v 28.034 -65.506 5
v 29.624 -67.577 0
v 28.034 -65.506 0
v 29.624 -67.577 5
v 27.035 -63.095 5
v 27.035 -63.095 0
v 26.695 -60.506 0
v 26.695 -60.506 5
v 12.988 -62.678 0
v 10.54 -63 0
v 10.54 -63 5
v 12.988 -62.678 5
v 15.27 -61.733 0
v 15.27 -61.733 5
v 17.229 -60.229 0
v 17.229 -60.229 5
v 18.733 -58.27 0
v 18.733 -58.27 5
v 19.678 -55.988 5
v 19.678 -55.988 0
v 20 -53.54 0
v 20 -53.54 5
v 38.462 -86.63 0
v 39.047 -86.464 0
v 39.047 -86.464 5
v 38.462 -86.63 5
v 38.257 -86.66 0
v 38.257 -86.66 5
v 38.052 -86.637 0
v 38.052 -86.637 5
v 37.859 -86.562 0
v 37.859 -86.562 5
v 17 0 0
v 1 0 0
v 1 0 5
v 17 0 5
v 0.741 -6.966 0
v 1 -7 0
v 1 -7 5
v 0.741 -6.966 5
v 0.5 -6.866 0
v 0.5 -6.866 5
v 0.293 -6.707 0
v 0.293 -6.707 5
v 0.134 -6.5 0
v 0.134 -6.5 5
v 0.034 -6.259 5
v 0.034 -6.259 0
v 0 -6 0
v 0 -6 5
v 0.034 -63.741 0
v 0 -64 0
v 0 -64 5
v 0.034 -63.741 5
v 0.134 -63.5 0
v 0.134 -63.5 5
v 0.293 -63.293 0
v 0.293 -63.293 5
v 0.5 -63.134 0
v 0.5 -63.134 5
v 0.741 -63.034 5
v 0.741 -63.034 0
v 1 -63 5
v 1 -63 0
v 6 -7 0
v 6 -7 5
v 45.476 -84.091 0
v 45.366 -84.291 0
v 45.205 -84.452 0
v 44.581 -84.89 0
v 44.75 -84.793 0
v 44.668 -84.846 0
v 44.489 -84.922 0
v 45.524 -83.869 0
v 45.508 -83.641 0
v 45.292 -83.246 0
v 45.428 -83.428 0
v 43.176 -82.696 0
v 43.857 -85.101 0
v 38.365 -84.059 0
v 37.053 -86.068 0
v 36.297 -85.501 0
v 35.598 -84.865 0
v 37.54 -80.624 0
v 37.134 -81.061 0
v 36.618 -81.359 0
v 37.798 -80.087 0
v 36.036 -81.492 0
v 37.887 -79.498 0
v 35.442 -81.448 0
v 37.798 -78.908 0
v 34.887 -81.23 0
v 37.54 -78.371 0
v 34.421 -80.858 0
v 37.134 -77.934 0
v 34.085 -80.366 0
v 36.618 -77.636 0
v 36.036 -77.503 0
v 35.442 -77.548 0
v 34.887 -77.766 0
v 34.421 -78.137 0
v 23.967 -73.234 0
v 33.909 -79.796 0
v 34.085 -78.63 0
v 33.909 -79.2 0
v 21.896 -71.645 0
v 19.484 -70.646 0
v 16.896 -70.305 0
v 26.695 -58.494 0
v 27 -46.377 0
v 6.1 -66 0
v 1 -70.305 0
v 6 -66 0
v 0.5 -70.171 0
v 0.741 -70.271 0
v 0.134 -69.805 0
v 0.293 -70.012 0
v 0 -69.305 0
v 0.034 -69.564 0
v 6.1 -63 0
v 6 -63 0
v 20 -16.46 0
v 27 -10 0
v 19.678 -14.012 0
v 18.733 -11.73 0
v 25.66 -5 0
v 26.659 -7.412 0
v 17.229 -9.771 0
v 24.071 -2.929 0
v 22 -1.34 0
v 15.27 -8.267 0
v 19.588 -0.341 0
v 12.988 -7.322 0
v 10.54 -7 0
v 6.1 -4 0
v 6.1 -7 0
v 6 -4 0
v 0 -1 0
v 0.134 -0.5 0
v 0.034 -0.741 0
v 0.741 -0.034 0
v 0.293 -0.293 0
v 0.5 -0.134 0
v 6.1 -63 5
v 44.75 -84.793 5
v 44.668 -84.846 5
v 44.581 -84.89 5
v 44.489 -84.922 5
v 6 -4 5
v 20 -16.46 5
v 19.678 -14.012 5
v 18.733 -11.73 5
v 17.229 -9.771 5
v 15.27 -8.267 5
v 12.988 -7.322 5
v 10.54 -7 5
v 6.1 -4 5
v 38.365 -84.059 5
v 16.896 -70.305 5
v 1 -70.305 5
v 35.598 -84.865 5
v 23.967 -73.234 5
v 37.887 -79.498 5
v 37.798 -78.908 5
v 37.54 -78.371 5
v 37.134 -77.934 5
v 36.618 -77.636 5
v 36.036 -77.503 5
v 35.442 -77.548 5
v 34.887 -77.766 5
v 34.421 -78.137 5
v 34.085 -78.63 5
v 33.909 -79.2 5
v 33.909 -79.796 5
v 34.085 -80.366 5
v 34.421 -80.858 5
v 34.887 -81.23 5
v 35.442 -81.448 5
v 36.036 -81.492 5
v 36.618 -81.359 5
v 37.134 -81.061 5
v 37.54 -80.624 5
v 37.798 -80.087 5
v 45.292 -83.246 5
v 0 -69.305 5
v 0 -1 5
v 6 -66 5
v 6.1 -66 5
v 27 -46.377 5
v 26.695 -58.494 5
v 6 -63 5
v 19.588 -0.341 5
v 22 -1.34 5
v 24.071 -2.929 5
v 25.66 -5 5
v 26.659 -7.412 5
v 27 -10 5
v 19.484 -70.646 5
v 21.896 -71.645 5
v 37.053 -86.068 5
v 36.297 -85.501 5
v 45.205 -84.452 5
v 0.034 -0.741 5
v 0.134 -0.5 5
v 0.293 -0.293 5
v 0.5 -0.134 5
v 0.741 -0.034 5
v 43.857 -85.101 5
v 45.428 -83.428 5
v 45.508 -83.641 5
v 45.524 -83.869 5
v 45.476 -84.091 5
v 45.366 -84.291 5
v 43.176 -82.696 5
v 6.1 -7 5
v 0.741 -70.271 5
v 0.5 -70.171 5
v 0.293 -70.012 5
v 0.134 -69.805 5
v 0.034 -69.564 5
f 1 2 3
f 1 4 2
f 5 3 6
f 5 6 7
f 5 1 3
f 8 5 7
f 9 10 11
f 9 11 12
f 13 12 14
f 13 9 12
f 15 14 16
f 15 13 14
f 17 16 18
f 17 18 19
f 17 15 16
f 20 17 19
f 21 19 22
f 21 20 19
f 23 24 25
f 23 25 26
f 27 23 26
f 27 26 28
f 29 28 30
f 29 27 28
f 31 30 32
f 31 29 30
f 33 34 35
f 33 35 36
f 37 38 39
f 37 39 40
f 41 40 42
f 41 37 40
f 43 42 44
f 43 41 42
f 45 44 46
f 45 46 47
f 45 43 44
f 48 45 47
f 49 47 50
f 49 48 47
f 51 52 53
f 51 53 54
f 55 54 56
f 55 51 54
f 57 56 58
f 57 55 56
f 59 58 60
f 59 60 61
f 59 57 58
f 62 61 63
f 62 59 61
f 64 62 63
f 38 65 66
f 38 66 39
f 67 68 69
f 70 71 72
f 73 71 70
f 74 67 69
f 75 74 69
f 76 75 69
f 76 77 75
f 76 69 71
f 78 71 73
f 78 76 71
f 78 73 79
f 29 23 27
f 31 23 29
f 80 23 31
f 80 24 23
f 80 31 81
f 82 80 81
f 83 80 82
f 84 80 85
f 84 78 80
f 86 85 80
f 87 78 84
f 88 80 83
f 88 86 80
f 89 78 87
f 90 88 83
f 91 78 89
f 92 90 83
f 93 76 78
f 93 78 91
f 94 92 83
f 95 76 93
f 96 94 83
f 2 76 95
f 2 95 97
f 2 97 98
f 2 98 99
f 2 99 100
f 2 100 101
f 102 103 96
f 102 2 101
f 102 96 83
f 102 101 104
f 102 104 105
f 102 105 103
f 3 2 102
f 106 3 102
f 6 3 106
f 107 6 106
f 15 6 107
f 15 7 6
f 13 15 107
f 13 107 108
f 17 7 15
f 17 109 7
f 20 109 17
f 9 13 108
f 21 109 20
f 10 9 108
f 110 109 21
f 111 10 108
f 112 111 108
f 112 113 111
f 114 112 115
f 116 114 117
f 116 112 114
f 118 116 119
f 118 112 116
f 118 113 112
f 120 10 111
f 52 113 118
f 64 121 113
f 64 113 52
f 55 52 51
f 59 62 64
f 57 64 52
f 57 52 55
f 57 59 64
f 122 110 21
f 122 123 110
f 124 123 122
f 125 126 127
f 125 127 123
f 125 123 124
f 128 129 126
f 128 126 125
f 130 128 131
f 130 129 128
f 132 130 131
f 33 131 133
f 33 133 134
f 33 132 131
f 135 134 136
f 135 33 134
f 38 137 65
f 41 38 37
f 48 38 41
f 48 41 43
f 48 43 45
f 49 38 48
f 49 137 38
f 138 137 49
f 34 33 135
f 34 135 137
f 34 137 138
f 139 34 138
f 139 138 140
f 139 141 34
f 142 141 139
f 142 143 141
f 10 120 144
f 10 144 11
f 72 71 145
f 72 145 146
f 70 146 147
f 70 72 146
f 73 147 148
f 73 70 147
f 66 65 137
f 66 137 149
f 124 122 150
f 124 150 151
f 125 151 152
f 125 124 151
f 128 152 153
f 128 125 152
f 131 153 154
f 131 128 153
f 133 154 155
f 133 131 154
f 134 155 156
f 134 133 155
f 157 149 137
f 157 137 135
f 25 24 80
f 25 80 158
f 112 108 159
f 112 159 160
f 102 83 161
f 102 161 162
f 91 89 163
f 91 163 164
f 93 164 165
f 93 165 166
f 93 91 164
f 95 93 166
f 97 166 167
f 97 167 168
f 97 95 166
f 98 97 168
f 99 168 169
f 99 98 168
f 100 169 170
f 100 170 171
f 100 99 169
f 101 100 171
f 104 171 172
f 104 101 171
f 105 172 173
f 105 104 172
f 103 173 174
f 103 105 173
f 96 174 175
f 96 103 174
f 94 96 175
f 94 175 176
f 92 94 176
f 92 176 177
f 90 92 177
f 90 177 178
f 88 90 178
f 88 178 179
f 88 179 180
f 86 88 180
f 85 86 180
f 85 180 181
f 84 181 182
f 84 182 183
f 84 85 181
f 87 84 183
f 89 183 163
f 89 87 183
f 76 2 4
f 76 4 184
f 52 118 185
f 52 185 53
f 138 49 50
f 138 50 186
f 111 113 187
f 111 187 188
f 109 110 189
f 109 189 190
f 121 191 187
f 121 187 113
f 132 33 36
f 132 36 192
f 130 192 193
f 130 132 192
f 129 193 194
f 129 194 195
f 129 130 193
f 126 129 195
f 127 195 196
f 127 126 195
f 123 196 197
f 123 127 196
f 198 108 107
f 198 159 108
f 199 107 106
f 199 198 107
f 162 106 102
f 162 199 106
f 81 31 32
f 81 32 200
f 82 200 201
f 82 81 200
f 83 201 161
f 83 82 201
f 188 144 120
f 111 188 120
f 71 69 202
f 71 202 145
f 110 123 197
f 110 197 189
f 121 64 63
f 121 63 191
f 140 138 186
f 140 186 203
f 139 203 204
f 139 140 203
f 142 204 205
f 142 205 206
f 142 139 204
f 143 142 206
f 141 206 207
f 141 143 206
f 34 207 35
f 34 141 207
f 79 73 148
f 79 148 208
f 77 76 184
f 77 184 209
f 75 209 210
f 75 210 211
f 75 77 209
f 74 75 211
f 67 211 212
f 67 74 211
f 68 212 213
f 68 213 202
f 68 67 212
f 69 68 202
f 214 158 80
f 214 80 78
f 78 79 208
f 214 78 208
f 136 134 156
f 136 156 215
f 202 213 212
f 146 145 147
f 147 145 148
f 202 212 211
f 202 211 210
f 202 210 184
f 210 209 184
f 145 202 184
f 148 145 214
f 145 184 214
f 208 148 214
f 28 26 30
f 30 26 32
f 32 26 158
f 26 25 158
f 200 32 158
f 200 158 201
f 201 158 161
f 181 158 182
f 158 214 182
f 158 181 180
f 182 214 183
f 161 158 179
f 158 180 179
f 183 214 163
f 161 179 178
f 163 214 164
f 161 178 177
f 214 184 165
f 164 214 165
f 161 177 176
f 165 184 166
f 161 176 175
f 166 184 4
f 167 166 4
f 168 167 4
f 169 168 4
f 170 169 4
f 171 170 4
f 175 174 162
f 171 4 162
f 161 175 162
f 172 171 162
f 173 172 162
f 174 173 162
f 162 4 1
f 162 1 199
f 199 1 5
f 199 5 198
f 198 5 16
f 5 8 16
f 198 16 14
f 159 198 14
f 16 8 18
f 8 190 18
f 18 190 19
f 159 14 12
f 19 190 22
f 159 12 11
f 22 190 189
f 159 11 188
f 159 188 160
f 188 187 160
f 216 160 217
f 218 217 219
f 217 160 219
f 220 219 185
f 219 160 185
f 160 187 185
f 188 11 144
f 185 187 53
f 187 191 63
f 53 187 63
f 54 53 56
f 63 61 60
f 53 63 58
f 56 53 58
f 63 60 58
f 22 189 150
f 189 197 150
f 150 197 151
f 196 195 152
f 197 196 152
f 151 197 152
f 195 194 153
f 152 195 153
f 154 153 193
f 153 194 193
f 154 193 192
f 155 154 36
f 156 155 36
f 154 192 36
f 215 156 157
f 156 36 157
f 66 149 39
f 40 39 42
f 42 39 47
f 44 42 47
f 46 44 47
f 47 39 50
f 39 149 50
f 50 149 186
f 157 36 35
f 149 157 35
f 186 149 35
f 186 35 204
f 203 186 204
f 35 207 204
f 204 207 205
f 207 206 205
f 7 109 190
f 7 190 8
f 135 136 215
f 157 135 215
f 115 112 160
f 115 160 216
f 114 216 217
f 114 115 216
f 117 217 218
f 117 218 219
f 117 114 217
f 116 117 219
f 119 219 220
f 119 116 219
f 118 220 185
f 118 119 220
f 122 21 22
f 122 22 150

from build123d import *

# Parameters (mm, degrees)
SKETCH1_R           = 2
BOSS_EXTRUDE1_DEPTH = 5
SKETCH2_W           = 0.1
SKETCH2_H           = 5
CUT_EXTRUDE1_DEPTH  = 3
SKETCH3_W           = 0.1
SKETCH3_H           = 5
CUT_EXTRUDE2_DEPTH  = 3
SKETCH4_W           = 5
SKETCH4_H           = 5
CUT_EXTRUDE3_DEPTH  = 2.5
FILLET1_R           = 10


with BuildPart() as part:
    # Sketch1 → Boss-Extrude1 (new body)
    with BuildSketch(Plane.XY):
        with BuildLine():
            Line((1, 0), (17, 0))
            ThreePointArc((17, 0), (24.071067812, -2.928932188), (27, -10))
            Line((27, -10), (27, -10.164726931))
            Line((27, -10.164726931), (27, -46.377180563))
            Line((27, -46.377180563), (26.694646109, -58.493944172))
            Line((26.694646109, -58.493944172), (26.694646109, -64.399649032))
            Line((26.694646109, -64.399649032), (26.694646109, -64.648499642))
            Line((26.694646109, -64.648499642), (45.291824906, -83.245678439))
            ThreePointArc((45.291824906, -83.245678439), (45.524094874, -83.868523218), (45.205420336, -84.451902592))
            Line((45.205420336, -84.451902592), (44.749875598, -84.792762343))
            ThreePointArc((44.749875598, -84.792762343), (44.625232832, -84.869323208), (44.488733304, -84.921908985))
            Line((44.488733304, -84.921908985), (38.461997774, -86.629961997))
            ThreePointArc((38.461997774, -86.629961997), (38.153804902, -86.655191857), (37.859066622, -86.561657168))
            ThreePointArc((37.859066622, -86.561657168), (36.668252624, -85.793859327), (35.597906198, -84.865468229))
            Line((35.597906198, -84.865468229), (21.037791859, -70.305353891))
            Line((21.037791859, -70.305353891), (16.801941123, -70.305353891))
            Line((16.801941123, -70.305353891), (1, -70.305353891))
            ThreePointArc((1, -70.305353891), (0.292893219, -70.012460672), (0, -69.305353891))
            Line((0, -69.305353891), (0, -64))
            ThreePointArc((0, -64), (0.292893219, -63.292893219), (1, -63))
            Line((1, -63), (10.539737479, -63))
            ThreePointArc((10.539737479, -63), (17.229153259, -60.229153259), (20, -53.539737479))
            Line((20, -53.539737479), (20, -16.460262521))
            ThreePointArc((20, -16.460262521), (17.229153259, -9.770846741), (10.539737479, -7))
            Line((10.539737479, -7), (1, -7))
            ThreePointArc((1, -7), (0.292893219, -6.707106781), (0, -6))
            Line((0, -6), (0, -1))
            ThreePointArc((0, -1), (0.292893219, -0.292893219), (1, 0))
        make_face()
        with Locations((35.887034264, -79.497742046)):
            Circle(SKETCH1_R, mode=Mode.SUBTRACT)
    extrude(amount=BOSS_EXTRUDE1_DEPTH)

    # Sketch2 → Cut-Extrude1 (cut)
    with BuildSketch(Plane(origin=(0, -63, 0), x_dir=(1, 0, 0), z_dir=(0, 1, 0))):
        with Locations((6.05, -2.5)):
            Rectangle(SKETCH2_W, SKETCH2_H)
    extrude(amount=-CUT_EXTRUDE1_DEPTH, mode=Mode.SUBTRACT)

    # Sketch3 → Cut-Extrude2 (cut)
    with BuildSketch(Plane.XZ.offset(7)):
        with Locations((6.05, 2.5)):
            Rectangle(SKETCH3_W, SKETCH3_H)
    extrude(amount=-CUT_EXTRUDE2_DEPTH, mode=Mode.SUBTRACT)

    # Sketch4 → Cut-Extrude3 (cut)
    with BuildSketch(Plane(origin=(25.586241806, -90.279113957, 0), x_dir=(0.962106712, 0.272673201, 0), z_dir=(0.272673201, -0.962106712, 0))):
        with Locations((16.490695772, 2.5)):
            Rectangle(SKETCH4_W, SKETCH4_H)
    extrude(amount=-CUT_EXTRUDE3_DEPTH, mode=Mode.SUBTRACT)

    # Fillet1
    fillet1_edges = [part.edges().sort_by_distance(p)[0] for p in [
        (26.694646109, -64.648499642, 2.5),
        (21.037791859, -70.305353891, 2.5),
    ]]
    fillet(fillet1_edges, radius=FILLET1_R)


solid = part.part
